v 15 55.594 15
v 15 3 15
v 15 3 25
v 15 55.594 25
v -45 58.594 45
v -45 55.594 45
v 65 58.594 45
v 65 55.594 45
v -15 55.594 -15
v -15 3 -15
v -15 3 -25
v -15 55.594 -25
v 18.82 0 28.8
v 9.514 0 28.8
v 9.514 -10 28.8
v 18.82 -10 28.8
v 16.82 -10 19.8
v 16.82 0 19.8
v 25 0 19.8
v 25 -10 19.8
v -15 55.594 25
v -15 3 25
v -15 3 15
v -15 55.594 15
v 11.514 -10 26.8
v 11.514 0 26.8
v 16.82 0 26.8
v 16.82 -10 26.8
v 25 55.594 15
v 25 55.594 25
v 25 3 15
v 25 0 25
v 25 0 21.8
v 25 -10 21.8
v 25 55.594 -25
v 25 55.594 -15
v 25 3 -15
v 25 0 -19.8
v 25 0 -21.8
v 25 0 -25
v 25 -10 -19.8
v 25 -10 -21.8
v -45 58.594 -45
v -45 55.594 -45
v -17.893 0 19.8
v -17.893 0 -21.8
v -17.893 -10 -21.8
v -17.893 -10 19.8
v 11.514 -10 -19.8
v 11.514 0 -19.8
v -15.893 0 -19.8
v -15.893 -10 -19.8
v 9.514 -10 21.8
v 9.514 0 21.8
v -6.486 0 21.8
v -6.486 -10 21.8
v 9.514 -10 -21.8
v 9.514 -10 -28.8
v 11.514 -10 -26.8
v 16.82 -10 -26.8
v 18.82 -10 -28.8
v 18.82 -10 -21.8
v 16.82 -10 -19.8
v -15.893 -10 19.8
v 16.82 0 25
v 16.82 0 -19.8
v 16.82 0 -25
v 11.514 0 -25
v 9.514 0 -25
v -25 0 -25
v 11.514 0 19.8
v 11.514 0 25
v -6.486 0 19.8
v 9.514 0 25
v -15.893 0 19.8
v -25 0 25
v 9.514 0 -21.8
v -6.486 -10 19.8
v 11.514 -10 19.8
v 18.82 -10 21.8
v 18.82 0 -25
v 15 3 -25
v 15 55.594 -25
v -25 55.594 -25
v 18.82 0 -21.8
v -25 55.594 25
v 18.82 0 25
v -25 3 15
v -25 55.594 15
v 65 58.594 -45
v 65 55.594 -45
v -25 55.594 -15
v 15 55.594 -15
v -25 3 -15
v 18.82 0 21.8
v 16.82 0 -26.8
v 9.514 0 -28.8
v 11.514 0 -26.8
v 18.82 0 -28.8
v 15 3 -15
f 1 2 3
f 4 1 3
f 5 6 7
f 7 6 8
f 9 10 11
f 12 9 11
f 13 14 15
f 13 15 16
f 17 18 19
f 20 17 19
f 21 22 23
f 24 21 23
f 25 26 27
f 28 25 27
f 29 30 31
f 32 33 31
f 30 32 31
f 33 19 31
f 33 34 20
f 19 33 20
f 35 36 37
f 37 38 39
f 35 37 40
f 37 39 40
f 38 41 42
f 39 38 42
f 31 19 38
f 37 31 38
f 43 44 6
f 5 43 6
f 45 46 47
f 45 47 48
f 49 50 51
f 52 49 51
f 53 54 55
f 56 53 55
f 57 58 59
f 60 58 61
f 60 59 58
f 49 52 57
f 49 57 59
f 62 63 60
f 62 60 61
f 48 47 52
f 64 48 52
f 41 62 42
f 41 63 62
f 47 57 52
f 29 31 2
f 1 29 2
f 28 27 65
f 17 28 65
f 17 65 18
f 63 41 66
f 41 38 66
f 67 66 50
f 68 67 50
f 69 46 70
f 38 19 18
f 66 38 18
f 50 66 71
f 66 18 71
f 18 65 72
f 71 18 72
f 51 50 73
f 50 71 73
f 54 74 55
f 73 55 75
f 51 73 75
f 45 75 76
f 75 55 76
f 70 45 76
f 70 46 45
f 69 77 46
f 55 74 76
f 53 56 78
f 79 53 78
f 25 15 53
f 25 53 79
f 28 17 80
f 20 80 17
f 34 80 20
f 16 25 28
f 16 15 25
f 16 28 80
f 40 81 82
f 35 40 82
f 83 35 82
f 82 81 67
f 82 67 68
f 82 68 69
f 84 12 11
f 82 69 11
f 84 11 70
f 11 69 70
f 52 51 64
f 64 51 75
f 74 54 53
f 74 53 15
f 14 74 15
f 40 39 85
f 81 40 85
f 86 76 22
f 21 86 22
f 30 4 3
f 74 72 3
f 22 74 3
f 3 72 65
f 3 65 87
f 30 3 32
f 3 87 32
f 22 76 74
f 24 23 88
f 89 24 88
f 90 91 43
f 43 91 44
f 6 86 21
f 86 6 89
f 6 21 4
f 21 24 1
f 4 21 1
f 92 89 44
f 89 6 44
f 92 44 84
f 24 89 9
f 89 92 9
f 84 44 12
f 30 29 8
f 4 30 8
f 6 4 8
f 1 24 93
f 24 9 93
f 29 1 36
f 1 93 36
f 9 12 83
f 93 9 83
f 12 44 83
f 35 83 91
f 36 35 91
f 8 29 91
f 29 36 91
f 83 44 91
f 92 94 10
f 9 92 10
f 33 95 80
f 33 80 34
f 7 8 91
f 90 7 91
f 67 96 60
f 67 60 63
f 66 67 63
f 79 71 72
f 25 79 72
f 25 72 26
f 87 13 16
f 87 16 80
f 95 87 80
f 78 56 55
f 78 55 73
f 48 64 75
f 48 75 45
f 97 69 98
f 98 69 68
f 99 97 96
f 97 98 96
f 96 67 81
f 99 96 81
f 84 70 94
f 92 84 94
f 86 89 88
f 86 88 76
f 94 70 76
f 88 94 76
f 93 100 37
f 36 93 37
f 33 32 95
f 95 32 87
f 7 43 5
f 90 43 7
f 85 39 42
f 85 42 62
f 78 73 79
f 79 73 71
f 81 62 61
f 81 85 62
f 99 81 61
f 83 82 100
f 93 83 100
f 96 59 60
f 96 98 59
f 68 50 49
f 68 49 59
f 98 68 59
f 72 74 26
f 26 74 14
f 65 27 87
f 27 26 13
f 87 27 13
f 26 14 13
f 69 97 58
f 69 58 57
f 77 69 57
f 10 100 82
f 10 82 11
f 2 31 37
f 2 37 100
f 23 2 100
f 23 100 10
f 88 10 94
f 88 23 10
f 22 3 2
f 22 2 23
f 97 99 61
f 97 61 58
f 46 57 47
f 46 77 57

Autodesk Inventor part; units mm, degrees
ref_plane "YZ Plane" through (0, 0, 0) normal (1, 0, 0) x (0, 1, 0)
ref_plane "XZ Plane" through (0, 0, 0) normal (0, 1, 0) x (-1, 0, 0)
ref_plane "XY Plane" through (0, 0, 0) normal (0, 0, 1) x (1, 0, 0)
sketch "Sketch1" plane through (0, 0, 0) normal (0, 1, 0) x (-1, 0, 0)
  line L0 (25, 25) -> (15, 25)
  line L1 (15, 25) -> (15, 15)
  line L2 (15, 15) -> (25, 15)
  line L3 (25, 15) -> (25, 25)
  line L4 (25, 25) -> (-25, 25)
  line L5 (-25, 25) -> (-25, -25)
  line L6 (-25, -25) -> (25, -25)
  line L7 (25, -25) -> (25, 25)
  line L8 (25, 0) -> (-25, 0)
  line L9 (0, 25) -> (0, -25)
  line L10 (-25, 25) -> (-25, 15)
  line L11 (-15, 25) -> (-25, 25)
  line L12 (-15, 15) -> (-15, 25)
  line L13 (-25, 15) -> (-15, 15)
  line L14 (15, -15) -> (15, -25)
  line L15 (25, -15) -> (15, -15)
  line L16 (25, -25) -> (25, -15)
  line L17 (15, -25) -> (25, -25)
  line L18 (-25, -15) -> (-25, -25)
  line L19 (-15, -15) -> (-25, -15)
  line L20 (-15, -25) -> (-15, -15)
  line L21 (-25, -25) -> (-15, -25)
  line L22 (45, 45) -> (-45, 45)
  line L23 (-45, 45) -> (-45, -45)
  line L24 (-45, -45) -> (45, -45)
  line L25 (45, -45) -> (45, 45)
  point P0 (0, 0)
  point P1 (20, 25)
  point P2 (-20, 25)
  point P3 (20, -15)
  point P4 (-20, -15)
  point P5 (0, 45)
  dimension "d0" = 10
  dimension "d1" = 10
  dimension "d2" = 0
  dimension "d3" = 0
  dimension "d4" = 0
  dimension "d5" = 0
  dimension "d8" = 40
  dimension "d11" = 40
  dimension "d14" = 50
  dimension "d15" = 50
  dimension "d42" = 20
  dimension "d43" = 20
  dimension "d44" = 20
  dimension "d45" = 20
extrude "Extrusion1" add sketch "Sketch1" along normal blind 3 contours L1 L2 L7 L8 L9 L4 | L9 L8 L5 L13 L12 L4 | L7 L15 L14 L6 L9 L8 | L9 L6 L20 L19 L5 L8
extrude "Extrusion2" add sketch "Sketch1" along normal blind 55.594 contours L3 L2 L1 L0 | L12 L13 L5 L4 | L7 L6 L14 L15 | L19 L20 L6 L5
sketch "Sketch2" plane through (0, 0, 0) normal (0, -1, 0) x (1, 0, 0)
  line L0 (25, 15) -> (25, -15) projected
  line L1 (25, -19.8) -> (-15.893, -19.8)
  line L2 (-15.893, -19.8) -> (-15.893, 19.8)
  line L3 (-15.893, 19.8) -> (25, 19.8)
  line L4 (25, 19.8) -> (25, -19.8)
  line L5 (16.82, -19.8) -> (11.514, -19.8)
  line L6 (11.514, -19.8) -> (11.514, -26.8)
  line L7 (11.514, -26.8) -> (16.82, -26.8)
  line L8 (16.82, -26.8) -> (16.82, -19.8)
  line L9 (-15.893, 0) -> (25, 0)
  line L10 (11.514, 19.8) -> (11.514, 26.8)
  line L11 (11.514, 26.8) -> (16.82, 26.8)
  line L12 (16.82, 26.8) -> (16.82, 19.8)
  line L13 (-9.486, 19.8) -> (-5.486, 19.8)
  line L14 (9.514, 21.8) -> (-6.486, 21.8)
  line L15 (9.514, 21.8) -> (9.514, 28.8)
  line L16 (9.514, 28.8) -> (18.82, 28.8)
  line L17 (18.82, 28.8) -> (18.82, 21.8)
  line L18 (18.82, 21.8) -> (25, 21.8)
  line L19 (25, -15) -> (25, -25) projected
  line L20 (25, -21.8) -> (18.82, -21.8)
  line L21 (18.82, -21.8) -> (18.82, -28.8)
  line L22 (18.82, -28.8) -> (9.514, -28.8)
  line L23 (9.514, -28.8) -> (9.514, -21.8)
  line L24 (9.514, -21.8) -> (1.695, -21.8)
  line L25 (1.695, -21.8) -> (-17.893, -21.8)
  line L26 (-17.893, -21.8) -> (-17.893, 21.8)
  line L27 (25, 19.8) -> (25, 21.8)
  line L28 (25, -15) -> (25, -19.8)
  line L29 (25, -21.8) -> (25, -15)
  line L30 (-15.893, 19.8) -> (-17.893, 19.8)
  line L31 (-6.486, 21.8) -> (-6.486, 19.8)
  point P0 (0, 0)
  point P1 (16.82, -23.3)
  point P2 (4.5535, -19.8)
  point P3 (18.82, -25.3)
  point P4 (14.167, 28.8)
  point P5 (14.167, 26.8)
  point P6 (11.514, 23.3)
  point P7 (16.82, 19.8)
  point P8 (25, 14.5)
  point P9 (11.514, 19.8)
  point P10 (11.514, -19.8)
  point P11 (14.167, -28.8)
  dimension "d20" = 39.6
  dimension "d22" = 40.893
  dimension "d23" = 8.18
  dimension "d25" = 5.306
  dimension "d26" = 7
  dimension "d30" = 2
  dimension "d31" = 2
  dimension "d32" = 2
  dimension "d33" = 2
  dimension "d36" = 2
  dimension "d37" = 2
  dimension "d38" = 2
  dimension "d53" = 0
  dimension "d54" = 16
  dimension "d55" = 2
  dimension "d56" = 2
extrude "Extrusion3" add sketch "Sketch2" along normal blind 10 contours L3 L12 L11 L10 L31 L14 L15 L16 L17 L18 L27 | L2 L1 L6 L7 L8 L19 L20 L21 L22 L23 L24 L25 L26 L30
sketch "Sketch3" plane through (0, 55.594, 0) normal (0, 1, 0) x (1, 0, 0)
  line L0 (-45, -45) -> (65, -45)
  line L1 (65, -45) -> (65, 45)
  line L2 (65, 45) -> (-45, 45)
  line L3 (-45, 45) -> (-45, -45)
  line L4 (-25, -25) -> (-15, -25) projected
  line L5 (25, -25) -> (25, -15) projected
  line L6 (15, 25) -> (-15, 25) projected
  line L7 (-25, 15) -> (-25, -15) projected
  point P0 (0, 0)
  dimension "d46" = 20
  dimension "d47" = 40
  dimension "d48" = 20
  dimension "d49" = 20
extrude "Extrusion4" add sketch "Sketch3" along normal blind 3
properties part number "pitchrollmount44"
